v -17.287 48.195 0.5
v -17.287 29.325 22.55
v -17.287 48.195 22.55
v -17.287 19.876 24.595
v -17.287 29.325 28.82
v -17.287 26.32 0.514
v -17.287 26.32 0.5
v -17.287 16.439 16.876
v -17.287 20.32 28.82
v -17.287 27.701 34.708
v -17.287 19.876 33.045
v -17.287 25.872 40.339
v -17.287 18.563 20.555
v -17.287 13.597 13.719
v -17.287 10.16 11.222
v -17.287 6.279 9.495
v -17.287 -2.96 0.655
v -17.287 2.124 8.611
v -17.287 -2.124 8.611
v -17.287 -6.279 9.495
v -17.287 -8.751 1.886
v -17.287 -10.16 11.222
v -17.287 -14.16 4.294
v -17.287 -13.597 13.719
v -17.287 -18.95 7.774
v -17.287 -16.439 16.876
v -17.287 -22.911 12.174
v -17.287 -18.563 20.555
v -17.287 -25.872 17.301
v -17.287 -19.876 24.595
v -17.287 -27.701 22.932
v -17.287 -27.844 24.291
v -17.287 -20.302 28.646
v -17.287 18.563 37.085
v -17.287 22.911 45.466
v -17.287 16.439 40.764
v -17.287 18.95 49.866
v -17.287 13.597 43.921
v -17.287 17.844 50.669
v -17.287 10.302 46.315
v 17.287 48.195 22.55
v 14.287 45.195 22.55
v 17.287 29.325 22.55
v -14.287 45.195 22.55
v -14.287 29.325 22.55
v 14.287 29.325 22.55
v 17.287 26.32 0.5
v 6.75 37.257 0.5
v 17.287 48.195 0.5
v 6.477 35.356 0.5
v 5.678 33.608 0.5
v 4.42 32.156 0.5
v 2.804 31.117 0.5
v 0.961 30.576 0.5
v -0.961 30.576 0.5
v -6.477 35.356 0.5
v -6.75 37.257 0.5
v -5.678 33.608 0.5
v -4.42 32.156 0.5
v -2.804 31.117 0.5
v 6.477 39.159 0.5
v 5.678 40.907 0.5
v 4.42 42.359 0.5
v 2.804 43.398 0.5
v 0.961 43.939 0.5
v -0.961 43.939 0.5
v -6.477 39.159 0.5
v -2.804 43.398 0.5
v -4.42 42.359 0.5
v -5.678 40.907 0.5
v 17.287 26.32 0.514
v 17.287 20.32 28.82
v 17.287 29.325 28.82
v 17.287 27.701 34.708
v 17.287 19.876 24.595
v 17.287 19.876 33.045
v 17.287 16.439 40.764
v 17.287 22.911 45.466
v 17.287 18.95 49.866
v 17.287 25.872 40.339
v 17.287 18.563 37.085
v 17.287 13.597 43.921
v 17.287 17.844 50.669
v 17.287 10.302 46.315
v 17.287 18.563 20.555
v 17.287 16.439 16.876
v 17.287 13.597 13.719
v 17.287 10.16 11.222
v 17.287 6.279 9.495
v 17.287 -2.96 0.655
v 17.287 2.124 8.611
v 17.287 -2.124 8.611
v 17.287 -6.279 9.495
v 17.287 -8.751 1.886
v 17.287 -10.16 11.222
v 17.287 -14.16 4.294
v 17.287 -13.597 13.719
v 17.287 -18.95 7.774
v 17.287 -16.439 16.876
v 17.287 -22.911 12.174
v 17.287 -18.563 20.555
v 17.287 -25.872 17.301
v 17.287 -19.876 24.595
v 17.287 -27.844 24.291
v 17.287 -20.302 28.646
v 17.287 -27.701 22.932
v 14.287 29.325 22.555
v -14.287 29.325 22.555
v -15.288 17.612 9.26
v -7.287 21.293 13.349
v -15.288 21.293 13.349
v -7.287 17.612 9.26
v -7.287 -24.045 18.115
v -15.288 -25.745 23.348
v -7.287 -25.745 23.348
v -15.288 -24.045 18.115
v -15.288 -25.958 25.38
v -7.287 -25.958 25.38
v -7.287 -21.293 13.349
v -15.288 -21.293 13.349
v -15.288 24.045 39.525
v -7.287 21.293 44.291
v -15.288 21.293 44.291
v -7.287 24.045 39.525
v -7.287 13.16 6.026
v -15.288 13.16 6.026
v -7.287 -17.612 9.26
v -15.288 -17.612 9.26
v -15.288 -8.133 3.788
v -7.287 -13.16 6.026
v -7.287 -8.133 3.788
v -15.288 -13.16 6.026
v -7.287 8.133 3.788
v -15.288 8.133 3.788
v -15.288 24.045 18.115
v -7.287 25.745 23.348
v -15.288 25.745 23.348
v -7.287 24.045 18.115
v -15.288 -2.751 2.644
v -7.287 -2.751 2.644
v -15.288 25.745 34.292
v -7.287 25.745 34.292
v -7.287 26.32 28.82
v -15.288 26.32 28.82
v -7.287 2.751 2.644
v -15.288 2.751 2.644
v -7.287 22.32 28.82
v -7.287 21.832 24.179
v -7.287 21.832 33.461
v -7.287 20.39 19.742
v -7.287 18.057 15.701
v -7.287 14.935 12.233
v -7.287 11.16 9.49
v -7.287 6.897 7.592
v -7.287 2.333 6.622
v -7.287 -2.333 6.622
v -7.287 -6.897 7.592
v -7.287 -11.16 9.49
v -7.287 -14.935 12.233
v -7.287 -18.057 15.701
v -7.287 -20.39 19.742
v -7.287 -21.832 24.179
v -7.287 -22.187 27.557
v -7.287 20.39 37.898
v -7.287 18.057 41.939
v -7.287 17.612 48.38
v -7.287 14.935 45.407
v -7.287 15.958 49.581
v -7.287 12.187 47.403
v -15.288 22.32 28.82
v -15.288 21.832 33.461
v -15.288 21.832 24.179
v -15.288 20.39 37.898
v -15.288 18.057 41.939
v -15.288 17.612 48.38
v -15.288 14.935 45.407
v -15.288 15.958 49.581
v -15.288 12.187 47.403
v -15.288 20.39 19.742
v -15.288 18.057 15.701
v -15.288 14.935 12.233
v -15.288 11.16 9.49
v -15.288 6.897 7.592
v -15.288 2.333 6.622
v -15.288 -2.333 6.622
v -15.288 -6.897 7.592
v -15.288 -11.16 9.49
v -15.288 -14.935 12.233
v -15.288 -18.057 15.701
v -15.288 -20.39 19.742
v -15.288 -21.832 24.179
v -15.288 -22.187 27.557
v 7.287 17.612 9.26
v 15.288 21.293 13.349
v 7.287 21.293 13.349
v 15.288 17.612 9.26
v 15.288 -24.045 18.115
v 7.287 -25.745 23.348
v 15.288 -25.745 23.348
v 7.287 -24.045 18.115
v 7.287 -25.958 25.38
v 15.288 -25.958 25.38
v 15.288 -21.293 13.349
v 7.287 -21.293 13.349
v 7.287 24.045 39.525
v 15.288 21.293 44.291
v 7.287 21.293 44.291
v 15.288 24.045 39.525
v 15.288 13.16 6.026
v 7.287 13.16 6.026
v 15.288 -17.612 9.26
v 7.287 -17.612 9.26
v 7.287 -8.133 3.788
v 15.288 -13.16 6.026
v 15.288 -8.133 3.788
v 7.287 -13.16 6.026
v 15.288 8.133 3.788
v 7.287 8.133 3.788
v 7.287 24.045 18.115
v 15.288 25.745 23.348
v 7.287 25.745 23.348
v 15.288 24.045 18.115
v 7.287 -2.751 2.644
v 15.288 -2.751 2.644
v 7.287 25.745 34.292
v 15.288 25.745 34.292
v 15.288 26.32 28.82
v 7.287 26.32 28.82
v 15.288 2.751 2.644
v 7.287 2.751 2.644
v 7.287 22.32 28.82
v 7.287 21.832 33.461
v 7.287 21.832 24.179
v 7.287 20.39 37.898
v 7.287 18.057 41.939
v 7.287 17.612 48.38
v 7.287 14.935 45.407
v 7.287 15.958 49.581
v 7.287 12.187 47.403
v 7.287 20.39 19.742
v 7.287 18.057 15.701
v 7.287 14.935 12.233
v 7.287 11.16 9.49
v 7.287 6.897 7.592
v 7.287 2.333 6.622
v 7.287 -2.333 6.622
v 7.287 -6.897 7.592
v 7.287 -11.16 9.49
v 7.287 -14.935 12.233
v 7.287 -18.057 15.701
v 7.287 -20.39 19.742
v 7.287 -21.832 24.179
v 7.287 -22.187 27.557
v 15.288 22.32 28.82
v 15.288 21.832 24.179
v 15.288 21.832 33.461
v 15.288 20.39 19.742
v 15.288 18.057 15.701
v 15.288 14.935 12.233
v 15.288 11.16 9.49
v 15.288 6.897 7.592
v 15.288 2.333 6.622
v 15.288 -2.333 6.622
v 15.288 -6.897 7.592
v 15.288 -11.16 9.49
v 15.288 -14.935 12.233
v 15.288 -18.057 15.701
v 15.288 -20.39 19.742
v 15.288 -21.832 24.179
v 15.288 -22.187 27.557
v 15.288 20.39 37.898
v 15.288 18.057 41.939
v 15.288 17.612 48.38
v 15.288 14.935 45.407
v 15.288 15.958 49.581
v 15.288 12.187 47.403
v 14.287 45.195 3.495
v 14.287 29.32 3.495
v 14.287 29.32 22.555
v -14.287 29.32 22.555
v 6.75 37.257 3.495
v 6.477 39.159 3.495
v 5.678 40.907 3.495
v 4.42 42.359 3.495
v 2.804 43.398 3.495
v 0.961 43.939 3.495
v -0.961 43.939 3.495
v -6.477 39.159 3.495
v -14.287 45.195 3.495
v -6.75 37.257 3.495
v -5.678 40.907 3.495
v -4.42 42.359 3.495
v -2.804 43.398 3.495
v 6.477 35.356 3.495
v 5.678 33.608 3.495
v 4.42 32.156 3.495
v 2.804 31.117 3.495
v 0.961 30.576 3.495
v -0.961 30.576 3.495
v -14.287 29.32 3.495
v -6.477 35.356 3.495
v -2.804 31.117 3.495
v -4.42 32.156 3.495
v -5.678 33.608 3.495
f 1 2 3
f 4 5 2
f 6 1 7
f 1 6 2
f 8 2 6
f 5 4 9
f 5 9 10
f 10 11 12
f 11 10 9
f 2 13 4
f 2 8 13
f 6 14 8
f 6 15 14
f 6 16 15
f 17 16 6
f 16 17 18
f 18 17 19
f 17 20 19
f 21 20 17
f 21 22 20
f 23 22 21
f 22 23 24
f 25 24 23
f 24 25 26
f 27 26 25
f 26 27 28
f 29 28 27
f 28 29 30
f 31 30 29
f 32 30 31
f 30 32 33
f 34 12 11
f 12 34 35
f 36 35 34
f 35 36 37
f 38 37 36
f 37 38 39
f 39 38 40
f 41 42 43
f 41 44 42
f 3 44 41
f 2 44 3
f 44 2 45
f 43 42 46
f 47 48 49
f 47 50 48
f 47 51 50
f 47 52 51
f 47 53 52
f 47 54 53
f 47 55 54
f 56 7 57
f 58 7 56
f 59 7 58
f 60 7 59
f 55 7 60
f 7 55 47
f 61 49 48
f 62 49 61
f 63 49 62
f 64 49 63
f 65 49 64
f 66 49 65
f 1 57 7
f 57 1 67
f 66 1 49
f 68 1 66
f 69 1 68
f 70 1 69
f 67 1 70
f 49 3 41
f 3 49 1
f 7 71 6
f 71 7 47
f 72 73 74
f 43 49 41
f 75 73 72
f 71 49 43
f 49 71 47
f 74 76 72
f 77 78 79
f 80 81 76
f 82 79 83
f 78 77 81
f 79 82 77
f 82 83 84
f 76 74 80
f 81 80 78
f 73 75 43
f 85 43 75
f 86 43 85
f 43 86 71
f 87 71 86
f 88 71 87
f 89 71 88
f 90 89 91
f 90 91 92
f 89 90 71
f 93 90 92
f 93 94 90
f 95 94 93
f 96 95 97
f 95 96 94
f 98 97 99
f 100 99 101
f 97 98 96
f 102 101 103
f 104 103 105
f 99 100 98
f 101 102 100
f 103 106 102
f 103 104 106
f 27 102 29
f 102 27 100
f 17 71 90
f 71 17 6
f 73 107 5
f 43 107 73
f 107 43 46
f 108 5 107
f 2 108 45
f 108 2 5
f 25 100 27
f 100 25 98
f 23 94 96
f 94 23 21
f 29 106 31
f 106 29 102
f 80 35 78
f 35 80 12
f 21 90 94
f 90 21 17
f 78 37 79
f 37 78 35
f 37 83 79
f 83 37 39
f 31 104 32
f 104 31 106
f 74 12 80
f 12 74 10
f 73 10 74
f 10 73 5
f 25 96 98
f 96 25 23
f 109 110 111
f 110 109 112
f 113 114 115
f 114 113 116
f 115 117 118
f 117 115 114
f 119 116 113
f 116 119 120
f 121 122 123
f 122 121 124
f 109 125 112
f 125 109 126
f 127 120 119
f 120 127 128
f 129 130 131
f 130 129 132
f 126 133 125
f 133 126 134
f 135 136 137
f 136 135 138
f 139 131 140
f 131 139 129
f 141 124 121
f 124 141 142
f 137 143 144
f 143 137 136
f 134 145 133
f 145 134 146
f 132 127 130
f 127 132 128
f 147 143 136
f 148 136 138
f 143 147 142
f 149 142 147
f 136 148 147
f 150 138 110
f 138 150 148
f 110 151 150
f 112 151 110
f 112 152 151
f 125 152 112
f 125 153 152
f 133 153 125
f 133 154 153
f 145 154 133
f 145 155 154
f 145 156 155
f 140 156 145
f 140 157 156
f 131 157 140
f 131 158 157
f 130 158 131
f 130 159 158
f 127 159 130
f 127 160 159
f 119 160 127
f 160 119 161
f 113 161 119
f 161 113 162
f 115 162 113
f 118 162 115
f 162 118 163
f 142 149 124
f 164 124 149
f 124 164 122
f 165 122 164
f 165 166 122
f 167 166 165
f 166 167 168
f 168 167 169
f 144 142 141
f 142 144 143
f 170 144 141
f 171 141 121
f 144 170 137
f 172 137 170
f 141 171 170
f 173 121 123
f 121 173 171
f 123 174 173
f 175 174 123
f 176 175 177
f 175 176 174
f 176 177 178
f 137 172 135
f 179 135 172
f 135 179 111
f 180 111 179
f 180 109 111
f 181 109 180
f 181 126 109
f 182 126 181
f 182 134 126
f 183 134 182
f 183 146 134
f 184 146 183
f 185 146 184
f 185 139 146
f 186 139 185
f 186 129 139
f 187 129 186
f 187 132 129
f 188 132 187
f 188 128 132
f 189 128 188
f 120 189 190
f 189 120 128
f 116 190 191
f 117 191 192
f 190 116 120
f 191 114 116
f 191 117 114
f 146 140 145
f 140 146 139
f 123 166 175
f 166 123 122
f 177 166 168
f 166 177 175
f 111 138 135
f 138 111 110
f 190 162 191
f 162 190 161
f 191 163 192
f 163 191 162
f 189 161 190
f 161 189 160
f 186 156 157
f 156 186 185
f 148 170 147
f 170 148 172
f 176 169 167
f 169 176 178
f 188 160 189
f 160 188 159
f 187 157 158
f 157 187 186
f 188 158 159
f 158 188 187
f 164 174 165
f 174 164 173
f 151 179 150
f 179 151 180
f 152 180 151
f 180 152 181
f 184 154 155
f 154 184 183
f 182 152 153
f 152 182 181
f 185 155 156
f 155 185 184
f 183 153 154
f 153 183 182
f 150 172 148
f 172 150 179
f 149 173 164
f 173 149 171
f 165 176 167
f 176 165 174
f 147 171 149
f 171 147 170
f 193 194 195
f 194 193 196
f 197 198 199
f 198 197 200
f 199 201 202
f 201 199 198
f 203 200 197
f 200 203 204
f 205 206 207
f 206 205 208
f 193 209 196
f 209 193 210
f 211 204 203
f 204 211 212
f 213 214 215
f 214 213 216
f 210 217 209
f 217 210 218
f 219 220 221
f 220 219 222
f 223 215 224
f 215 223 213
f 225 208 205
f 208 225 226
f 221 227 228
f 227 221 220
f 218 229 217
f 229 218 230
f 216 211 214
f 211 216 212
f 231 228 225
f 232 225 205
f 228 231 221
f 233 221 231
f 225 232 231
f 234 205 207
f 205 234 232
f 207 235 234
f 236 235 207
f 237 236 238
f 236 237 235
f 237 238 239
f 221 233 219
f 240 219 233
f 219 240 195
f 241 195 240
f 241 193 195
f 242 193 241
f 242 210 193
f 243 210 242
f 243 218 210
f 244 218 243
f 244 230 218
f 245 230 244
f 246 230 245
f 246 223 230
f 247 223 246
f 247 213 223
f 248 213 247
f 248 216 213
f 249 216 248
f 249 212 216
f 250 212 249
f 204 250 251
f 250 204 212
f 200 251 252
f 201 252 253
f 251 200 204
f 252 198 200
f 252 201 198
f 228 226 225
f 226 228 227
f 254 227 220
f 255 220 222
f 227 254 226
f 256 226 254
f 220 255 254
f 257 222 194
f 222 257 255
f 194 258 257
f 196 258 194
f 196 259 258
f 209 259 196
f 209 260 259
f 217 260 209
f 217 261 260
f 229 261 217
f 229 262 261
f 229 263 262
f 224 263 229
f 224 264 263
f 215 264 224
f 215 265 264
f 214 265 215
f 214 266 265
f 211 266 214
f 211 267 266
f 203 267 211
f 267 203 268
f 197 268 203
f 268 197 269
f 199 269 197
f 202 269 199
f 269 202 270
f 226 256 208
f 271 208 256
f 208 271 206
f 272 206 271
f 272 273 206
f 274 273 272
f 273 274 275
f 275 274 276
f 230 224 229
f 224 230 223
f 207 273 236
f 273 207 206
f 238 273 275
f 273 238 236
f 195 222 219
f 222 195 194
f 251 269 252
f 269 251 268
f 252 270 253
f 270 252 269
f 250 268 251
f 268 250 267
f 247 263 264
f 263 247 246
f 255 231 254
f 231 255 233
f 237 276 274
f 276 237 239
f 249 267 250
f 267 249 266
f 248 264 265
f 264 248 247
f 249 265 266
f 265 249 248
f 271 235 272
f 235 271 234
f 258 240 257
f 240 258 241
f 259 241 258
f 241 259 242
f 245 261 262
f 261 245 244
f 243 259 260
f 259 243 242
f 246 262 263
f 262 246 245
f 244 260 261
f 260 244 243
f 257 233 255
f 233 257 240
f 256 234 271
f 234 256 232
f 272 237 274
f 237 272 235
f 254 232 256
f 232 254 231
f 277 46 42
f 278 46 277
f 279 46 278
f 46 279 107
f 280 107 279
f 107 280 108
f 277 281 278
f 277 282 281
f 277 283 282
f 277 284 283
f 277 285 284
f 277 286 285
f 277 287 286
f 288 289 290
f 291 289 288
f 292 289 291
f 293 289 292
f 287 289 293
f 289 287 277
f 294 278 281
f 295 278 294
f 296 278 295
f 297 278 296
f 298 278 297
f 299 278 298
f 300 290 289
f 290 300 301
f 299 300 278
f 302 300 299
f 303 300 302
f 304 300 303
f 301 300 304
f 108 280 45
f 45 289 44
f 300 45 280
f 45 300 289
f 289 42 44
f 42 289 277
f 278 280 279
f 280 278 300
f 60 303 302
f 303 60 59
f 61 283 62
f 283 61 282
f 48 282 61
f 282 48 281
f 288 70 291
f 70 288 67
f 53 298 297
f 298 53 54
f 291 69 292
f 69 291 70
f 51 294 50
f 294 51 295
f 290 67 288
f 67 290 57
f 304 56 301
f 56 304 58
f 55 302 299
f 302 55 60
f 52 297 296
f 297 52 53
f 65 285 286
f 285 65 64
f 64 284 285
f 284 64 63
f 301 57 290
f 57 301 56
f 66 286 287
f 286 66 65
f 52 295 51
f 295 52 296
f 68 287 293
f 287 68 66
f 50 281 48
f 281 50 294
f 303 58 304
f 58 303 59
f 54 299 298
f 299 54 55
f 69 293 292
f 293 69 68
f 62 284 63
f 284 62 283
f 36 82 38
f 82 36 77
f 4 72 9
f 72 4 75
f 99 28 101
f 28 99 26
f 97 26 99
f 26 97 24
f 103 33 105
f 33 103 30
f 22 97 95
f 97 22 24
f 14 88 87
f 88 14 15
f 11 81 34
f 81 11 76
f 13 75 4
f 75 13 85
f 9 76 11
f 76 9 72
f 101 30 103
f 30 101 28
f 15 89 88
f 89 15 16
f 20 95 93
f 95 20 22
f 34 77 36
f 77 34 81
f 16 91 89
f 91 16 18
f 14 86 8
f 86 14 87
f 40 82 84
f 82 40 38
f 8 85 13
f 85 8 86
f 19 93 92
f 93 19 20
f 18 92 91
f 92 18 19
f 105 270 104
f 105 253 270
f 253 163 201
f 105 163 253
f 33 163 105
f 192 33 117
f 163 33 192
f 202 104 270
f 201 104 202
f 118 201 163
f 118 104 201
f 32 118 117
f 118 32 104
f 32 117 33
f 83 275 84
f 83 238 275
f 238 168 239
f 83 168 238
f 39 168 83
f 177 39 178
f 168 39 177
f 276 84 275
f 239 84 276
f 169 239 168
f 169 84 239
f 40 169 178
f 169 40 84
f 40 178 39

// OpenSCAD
function switchx() = 9/8*25.4;
function switchy() = 5/8*25.4;
function switchwall() = 3;
module switch(d=3,s=1) {
    x=switchx();
    y=switchy();
    z=3/4*25.4;
    w=switchwall();
    r=1/2*25.4/2+.4;
    if (s==1) {
        translate([0,0,(z+d)/2]) cube([x+2*w,y+2*w,z+d],true);
    } else {
        translate([0,0,z/2+d]) cube([x,y,z+0.01],true);
        translate([0,0,-0.005]) cylinder(r=r,h=d+0.01);
    }
}
module test() {
    difference() {
        union() {
            translate([0,0,1.5]) cube([switchx()+2*switchwall()+10,switchy()+2*switchwall()+10,3],true);
            switch(d=3,s=1);
        }
        switch(d=3,s=0);
    }
}

module barmount(d=1.6*25.4) {
    zipt=4;
    zipw=8;
    w=2;
    sz=(d+4*w+2*zipt)/2;
    y=switchx()+2*switchwall();
    translate([0,0,(d+4*w+2*zipt)/2+.5]) rotate([-90,0,0]) intersection() {
        //difference() {
        //    translate([0,0,100]) cube(200,true);
            rotate([-60,0,0]) translate([0,0,90]) cube(200,true);
        //}
        difference() {
            union() {
                translate([0,sz,(d+4*w+2.5*zipt+switchy())/2]) rotate([90,0,0]) switch(d=3,s=1);
                hull() {
                    translate([0,sz/2,(d+4*w+2.5*zipt)/2]) cube([y,sz,0.01],true);
                    rotate([0,90,0]) cylinder(d=d+4*w+2*zipt,h=y,center=true);
                }
            }
            rotate([0,90,0]) cylinder(d=d,h=y+0.01,center=true);
            for (m=[0,1]) mirror([m,0,0]) translate([zipw/2-y/2+w,0,0]) rotate([0,90,0]) difference() {
                cylinder(d=d+2*w+2*zipt,h=zipw,center=true);
                cylinder(d=d+2*w,h=zipw+0.01,center=true);
            }
                translate([0,sz,(d+4*w+2.5*zipt+switchy())/2]) rotate([90,0,0]) switch(d=3,s=0);
        }
    }
}
barmount();
